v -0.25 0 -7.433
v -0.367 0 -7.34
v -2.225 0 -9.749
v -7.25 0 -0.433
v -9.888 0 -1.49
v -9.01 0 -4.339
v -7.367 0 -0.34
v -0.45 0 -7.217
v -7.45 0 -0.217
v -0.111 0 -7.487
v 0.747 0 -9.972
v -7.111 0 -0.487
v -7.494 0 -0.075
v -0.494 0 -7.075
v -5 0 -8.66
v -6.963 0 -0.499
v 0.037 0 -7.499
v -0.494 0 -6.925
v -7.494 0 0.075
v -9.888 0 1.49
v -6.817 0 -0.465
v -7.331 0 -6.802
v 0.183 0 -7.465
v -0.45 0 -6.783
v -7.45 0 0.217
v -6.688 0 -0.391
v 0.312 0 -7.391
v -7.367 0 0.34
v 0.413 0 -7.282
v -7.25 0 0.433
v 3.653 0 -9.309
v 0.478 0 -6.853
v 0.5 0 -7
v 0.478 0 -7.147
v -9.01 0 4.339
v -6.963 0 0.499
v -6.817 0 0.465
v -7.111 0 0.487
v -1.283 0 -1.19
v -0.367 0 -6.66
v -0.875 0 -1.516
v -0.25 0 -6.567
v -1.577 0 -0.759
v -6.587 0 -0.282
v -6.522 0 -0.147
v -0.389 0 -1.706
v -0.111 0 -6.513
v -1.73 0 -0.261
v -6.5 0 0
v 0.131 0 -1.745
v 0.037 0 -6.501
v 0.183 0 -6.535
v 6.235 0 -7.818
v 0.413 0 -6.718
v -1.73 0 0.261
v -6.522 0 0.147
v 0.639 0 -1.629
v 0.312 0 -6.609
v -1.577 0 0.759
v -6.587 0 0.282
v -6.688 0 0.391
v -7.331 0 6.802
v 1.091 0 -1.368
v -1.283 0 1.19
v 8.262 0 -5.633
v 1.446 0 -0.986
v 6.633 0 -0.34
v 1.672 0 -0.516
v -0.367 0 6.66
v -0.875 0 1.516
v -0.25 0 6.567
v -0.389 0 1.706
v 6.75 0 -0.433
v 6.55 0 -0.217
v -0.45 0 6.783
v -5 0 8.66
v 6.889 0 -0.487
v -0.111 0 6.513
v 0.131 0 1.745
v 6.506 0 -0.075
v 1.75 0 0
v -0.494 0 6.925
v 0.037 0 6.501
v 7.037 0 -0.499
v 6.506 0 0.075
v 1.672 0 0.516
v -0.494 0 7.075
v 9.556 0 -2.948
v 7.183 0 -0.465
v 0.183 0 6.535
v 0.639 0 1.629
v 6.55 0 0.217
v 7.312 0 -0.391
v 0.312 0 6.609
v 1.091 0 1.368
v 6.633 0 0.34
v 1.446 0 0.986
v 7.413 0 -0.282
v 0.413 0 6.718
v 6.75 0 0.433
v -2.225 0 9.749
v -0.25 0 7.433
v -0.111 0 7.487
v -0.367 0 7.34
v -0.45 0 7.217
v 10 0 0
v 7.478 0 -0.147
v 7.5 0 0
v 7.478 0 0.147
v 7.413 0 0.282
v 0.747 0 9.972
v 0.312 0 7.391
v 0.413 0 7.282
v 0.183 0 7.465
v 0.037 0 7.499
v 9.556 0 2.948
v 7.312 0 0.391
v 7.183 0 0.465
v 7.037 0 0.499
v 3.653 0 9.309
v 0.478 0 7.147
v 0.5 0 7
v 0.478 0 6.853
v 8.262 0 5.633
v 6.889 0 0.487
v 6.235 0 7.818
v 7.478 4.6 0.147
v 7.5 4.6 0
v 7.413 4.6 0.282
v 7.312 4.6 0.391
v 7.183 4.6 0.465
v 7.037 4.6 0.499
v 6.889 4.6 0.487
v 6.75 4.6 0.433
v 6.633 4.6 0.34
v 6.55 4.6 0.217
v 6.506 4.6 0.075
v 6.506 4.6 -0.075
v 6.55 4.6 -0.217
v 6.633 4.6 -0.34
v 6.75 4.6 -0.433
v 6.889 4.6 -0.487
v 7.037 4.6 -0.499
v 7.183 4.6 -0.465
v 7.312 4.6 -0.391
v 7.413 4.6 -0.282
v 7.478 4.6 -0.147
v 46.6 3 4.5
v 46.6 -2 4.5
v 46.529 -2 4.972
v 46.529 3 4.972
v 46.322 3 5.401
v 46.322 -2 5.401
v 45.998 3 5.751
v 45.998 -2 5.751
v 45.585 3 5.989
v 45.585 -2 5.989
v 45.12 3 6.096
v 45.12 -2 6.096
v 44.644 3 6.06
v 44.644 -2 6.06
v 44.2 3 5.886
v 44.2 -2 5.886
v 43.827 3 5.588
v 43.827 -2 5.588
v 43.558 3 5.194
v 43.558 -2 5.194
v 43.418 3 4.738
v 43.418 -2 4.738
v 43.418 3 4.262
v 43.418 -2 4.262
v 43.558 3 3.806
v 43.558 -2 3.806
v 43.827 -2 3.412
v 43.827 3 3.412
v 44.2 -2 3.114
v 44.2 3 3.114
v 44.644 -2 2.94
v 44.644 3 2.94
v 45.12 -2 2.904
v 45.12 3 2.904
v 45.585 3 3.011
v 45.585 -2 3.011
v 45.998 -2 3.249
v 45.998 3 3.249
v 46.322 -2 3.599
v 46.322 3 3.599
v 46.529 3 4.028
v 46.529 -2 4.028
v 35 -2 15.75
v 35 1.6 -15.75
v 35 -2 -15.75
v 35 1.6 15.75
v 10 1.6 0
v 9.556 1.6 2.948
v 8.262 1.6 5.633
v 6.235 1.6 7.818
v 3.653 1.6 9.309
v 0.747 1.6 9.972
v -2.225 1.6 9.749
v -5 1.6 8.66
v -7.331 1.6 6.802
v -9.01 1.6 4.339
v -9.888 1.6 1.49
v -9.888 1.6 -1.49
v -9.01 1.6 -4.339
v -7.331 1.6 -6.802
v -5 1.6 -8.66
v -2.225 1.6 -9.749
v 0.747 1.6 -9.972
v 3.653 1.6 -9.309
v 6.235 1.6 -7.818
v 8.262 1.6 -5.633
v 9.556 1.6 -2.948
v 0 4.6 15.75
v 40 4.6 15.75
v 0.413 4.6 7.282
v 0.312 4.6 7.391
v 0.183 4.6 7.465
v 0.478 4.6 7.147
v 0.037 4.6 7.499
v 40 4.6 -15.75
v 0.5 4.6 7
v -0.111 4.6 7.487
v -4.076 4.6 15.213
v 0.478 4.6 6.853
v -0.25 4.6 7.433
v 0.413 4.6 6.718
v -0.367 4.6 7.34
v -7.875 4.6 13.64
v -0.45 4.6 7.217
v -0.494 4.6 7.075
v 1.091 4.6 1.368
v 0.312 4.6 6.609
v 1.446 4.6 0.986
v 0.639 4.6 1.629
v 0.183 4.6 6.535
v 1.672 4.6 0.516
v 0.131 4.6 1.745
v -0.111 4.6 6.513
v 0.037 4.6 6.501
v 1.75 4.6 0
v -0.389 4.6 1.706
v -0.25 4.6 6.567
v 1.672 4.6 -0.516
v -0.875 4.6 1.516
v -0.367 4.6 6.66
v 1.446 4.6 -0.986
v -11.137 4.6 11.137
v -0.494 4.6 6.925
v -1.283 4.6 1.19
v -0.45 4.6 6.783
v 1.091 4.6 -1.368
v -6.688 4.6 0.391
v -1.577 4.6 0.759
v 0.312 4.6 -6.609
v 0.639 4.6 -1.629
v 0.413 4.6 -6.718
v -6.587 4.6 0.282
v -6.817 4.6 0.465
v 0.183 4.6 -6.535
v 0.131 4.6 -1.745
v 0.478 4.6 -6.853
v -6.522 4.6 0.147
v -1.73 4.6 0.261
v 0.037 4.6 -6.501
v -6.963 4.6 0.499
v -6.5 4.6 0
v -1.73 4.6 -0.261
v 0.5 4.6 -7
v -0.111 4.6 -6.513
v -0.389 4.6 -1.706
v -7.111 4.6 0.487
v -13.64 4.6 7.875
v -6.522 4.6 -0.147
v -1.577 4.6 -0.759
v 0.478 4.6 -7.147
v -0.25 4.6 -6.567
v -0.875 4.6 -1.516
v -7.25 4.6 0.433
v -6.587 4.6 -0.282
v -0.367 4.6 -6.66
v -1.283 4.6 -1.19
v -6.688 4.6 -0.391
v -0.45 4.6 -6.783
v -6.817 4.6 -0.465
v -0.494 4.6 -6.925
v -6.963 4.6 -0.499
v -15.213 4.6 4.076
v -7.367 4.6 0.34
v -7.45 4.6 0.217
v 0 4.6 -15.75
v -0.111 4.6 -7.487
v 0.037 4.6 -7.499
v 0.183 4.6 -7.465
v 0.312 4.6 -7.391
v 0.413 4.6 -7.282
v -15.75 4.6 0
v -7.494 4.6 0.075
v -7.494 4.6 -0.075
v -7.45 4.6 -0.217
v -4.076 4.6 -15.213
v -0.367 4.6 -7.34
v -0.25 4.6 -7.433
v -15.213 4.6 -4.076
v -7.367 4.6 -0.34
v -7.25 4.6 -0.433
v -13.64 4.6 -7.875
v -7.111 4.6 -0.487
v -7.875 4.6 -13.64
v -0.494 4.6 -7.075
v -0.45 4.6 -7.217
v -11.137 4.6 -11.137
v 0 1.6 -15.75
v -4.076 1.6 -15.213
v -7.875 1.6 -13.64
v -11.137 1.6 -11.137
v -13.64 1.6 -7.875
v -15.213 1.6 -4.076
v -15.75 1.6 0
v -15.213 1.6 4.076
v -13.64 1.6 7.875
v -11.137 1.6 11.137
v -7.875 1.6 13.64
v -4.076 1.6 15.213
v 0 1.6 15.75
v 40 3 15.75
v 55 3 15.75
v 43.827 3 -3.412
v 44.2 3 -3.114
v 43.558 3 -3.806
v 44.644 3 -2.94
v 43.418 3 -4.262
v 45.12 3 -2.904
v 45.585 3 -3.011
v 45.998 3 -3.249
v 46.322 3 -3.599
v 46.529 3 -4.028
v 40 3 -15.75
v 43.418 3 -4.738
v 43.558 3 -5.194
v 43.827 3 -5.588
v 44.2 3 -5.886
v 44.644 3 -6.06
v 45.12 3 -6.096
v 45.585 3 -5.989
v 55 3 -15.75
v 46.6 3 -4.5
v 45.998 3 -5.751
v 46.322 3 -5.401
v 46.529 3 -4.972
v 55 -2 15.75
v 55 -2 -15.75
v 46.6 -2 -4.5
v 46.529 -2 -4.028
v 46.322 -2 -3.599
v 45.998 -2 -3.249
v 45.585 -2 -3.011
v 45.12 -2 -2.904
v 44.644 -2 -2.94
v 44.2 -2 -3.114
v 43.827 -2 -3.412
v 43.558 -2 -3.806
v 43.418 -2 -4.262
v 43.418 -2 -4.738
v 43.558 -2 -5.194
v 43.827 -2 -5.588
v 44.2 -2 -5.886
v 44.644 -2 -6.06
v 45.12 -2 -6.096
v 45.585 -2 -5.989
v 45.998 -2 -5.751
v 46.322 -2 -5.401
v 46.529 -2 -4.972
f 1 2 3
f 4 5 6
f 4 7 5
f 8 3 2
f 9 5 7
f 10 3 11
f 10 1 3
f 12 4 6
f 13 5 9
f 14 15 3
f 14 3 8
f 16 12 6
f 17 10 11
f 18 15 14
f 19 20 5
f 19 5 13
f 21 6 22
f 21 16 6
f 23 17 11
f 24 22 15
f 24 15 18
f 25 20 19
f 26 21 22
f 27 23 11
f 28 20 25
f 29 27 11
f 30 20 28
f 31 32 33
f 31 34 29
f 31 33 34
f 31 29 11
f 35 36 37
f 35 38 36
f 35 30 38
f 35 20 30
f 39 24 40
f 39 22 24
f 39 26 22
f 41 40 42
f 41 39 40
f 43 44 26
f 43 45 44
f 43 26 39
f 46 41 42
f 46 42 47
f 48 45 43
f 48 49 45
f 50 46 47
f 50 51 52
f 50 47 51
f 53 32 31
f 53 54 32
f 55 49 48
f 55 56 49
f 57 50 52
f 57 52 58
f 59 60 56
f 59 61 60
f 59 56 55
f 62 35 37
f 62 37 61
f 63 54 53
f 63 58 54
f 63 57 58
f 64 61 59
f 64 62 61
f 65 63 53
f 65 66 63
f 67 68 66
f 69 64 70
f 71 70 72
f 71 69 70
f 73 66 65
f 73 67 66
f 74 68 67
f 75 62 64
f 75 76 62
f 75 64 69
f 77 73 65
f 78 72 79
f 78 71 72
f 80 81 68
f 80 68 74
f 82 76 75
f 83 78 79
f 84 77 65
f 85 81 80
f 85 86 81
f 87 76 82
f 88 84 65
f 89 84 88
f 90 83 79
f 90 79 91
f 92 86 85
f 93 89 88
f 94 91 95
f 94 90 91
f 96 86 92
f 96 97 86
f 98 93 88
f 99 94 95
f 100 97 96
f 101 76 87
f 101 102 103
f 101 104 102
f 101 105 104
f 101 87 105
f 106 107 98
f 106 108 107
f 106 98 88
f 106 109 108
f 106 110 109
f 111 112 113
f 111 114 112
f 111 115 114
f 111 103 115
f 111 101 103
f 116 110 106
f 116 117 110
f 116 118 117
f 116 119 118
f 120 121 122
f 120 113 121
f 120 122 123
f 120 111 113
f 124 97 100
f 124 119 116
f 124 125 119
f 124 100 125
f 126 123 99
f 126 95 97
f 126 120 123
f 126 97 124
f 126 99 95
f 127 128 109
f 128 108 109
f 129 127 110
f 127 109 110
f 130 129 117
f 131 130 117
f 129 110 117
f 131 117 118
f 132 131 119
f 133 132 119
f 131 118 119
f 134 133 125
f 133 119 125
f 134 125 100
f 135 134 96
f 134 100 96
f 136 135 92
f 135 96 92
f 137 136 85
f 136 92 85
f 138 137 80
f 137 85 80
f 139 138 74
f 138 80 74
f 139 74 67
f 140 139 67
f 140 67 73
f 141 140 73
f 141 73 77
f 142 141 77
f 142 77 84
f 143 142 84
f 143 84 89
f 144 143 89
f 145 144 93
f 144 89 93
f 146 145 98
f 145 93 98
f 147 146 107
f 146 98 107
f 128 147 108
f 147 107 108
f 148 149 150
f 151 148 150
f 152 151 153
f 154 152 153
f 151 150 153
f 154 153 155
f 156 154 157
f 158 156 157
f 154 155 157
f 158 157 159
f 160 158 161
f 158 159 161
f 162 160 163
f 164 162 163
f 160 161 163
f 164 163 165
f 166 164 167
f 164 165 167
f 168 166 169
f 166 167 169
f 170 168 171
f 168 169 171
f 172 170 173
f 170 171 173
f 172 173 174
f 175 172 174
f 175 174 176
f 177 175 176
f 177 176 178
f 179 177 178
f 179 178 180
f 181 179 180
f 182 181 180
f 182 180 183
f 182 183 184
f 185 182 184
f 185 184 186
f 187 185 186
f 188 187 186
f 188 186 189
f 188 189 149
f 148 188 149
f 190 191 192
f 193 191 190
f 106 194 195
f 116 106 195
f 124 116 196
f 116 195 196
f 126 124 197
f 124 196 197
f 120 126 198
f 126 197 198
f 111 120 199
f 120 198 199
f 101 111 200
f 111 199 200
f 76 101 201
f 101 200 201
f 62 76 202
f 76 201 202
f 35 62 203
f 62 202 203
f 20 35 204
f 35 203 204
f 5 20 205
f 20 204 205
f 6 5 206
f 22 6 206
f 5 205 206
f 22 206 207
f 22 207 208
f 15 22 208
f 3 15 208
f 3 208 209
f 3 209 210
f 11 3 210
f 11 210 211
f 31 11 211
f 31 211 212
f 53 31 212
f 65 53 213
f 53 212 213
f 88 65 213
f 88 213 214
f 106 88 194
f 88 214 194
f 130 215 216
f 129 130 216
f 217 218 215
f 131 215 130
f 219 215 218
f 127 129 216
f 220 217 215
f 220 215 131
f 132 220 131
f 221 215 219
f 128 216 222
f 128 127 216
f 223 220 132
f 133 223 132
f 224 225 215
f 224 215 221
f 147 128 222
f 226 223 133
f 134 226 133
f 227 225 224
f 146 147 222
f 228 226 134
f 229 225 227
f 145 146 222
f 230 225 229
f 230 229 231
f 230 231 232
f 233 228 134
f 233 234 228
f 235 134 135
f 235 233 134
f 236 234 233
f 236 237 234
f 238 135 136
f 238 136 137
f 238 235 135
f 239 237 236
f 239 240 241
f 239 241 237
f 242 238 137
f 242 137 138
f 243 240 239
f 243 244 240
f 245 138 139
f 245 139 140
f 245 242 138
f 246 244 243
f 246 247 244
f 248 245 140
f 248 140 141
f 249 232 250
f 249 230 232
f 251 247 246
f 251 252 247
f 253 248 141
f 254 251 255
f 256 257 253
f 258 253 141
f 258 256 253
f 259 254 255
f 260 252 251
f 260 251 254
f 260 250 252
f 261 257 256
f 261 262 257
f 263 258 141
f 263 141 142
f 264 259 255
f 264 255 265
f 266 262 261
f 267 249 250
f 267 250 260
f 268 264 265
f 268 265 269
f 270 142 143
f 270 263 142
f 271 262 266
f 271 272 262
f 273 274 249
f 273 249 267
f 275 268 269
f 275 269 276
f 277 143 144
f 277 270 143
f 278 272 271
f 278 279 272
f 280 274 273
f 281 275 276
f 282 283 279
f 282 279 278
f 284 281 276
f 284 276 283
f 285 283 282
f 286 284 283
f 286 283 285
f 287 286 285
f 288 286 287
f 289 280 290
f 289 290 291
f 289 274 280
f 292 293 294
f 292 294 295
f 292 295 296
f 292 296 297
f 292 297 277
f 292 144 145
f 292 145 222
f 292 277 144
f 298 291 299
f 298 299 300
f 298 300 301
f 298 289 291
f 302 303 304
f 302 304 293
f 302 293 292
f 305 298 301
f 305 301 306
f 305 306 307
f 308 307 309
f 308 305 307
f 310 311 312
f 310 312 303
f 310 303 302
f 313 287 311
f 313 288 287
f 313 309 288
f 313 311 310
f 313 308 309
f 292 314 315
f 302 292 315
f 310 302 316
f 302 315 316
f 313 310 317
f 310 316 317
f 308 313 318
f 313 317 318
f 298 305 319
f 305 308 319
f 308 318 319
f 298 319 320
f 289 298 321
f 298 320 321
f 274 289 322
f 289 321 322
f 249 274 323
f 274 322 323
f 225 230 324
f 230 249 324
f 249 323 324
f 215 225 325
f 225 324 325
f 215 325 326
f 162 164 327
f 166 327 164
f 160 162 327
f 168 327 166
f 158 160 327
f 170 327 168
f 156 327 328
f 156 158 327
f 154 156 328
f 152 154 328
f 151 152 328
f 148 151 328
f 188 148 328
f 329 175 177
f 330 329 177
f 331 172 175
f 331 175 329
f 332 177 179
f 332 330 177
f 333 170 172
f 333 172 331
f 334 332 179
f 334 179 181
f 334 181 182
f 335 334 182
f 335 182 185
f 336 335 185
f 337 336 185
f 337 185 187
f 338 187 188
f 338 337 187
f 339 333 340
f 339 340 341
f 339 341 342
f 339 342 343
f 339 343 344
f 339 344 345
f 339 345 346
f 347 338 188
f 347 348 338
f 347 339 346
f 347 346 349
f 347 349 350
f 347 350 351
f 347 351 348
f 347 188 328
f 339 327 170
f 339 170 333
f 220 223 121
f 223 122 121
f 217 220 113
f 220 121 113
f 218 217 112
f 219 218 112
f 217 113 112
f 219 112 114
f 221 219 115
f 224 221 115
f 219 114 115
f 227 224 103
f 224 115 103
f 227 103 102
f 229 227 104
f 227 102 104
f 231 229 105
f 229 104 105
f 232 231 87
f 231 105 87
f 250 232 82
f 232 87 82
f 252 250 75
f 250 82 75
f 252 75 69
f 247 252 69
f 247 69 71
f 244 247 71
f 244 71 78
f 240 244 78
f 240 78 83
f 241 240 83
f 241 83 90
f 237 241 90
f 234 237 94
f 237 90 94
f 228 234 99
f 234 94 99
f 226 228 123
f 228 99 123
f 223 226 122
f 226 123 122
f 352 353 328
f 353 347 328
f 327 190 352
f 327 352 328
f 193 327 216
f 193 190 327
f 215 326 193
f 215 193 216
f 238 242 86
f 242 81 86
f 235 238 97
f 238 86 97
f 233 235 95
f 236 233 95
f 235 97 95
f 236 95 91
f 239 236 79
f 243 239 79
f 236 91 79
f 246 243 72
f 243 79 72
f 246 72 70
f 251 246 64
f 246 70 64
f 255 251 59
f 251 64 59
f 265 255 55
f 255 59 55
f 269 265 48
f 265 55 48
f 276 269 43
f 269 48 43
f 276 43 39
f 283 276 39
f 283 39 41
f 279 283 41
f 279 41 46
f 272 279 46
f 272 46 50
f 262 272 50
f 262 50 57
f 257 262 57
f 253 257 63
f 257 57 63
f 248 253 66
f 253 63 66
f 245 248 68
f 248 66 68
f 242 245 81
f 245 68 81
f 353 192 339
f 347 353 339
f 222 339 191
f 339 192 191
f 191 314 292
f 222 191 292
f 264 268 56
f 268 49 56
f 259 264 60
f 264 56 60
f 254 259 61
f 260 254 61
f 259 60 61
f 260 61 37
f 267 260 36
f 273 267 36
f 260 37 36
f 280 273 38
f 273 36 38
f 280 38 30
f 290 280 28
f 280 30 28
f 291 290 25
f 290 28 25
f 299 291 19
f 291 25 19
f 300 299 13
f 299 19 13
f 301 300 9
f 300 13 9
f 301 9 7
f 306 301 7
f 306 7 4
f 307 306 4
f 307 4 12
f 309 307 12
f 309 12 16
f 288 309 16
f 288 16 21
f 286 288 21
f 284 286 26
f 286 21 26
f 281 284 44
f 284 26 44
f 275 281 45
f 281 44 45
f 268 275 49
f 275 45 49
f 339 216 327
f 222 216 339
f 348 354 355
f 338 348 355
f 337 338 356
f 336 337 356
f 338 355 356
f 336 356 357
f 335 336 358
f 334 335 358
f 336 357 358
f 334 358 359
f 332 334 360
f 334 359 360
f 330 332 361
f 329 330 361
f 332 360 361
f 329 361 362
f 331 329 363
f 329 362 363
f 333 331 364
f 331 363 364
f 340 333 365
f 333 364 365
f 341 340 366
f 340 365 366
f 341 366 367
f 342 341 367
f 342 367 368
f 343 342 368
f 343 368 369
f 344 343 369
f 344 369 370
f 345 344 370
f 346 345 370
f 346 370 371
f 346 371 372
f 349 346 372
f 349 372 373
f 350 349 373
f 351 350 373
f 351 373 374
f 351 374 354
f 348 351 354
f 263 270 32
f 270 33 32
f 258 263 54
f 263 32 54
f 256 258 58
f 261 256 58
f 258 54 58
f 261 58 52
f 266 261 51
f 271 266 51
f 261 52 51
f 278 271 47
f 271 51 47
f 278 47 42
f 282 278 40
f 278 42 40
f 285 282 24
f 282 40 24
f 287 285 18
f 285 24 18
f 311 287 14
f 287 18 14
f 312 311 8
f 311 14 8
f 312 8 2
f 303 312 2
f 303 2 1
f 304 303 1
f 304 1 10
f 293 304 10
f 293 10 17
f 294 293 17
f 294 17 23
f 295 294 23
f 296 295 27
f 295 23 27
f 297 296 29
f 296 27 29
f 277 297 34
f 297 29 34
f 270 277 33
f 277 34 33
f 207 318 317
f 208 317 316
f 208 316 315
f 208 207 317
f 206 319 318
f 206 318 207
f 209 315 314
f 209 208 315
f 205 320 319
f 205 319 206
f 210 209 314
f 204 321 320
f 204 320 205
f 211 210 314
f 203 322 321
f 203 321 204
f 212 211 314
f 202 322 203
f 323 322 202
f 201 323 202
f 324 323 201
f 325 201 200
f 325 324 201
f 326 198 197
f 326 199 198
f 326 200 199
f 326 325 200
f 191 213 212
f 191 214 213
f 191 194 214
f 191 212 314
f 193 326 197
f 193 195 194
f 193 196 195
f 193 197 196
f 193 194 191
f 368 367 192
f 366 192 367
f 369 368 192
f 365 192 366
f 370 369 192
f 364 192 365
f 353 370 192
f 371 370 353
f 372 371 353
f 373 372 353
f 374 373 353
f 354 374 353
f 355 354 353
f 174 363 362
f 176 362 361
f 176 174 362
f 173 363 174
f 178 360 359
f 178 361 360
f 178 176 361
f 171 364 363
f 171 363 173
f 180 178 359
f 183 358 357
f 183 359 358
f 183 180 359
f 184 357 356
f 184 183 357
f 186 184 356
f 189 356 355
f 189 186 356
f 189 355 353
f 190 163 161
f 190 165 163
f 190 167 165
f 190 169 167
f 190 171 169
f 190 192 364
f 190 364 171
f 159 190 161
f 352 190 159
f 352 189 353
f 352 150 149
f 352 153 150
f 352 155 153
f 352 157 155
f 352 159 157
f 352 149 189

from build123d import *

# Parameters (mm, degrees)
EXTRUDE_1_DEPTH     = 3
SKETCH_3_W          = 20
SKETCH_3_H          = 31.5
EXTRUDE_2_DEPTH     = 2
SKETCH_4_R          = 0.5
CUT_EXTRUDE_1_DEPTH = 10
SKETCH_5_R          = 1.6
CUT_EXTRUDE_2_DEPTH = 10
SKETCH_6_R          = 1.75
CUT_EXTRUDE_3_DEPTH = 17
CUT_EXTRUDE_4_DEPTH = 1.6
EXTRUDE_3_DEPTH     = 3
SKETCH_9_W          = 31.5
SKETCH_9_H          = 1.6
EXTRUDE_4_DEPTH     = 3
SKETCH_10_R         = 1.75
SKETCH_10_R_2       = 0.5
CUT_EXTRUDE_5_DEPTH = 10
SKETCH_12_R         = 10
EXTRUDE_6_DEPTH     = 1.6
SKETCH_13_W         = 31.5
SKETCH_13_H         = 1.6
EXTRUDE_7_DEPTH     = 2
SKETCH_15_R         = 1.75
SKETCH_15_R_2       = 0.5
CUT_EXTRUDE_6_DEPTH = 12


with BuildPart() as part:
    # 草图1 → 凸台-拉伸1 (new body)
    with BuildSketch(Plane(origin=(0, 0, 0), x_dir=(1, 0, 0), z_dir=(0, 1, 0))):
        with BuildLine():
            Line((0, -15.75), (55, -15.75))
            Line((55, -15.75), (55, 15.75))
            Line((55, 15.75), (0, 15.75))
            ThreePointArc((0, 15.75), (-15.75, 0), (0, -15.75))
        make_face()
    extrude(amount=EXTRUDE_1_DEPTH)

    # 草图3 → 凸台-拉伸2 (add)
    with BuildSketch(Plane.XZ):
        with Locations((45, 0)):
            Rectangle(SKETCH_3_W, SKETCH_3_H)
    extrude(amount=EXTRUDE_2_DEPTH)

    # 草图4 → 切除-拉伸1 (cut)
    with BuildSketch(Plane.XZ):
        with Locations((0, 7)):
            Circle(SKETCH_4_R)
        with Locations((7, 0)):
            Circle(SKETCH_4_R)
        with Locations((0, -7)):
            Circle(SKETCH_4_R)
        with Locations((-7, 0)):
            Circle(SKETCH_4_R)
    extrude(amount=-CUT_EXTRUDE_1_DEPTH, mode=Mode.SUBTRACT)

    # 草图5 → 切除-拉伸2 (cut)
    with BuildSketch(Plane.XZ.offset(2)):
        with Locations((45, -4.5)):
            Circle(SKETCH_5_R)
        with Locations((45, 4.5)):
            Circle(SKETCH_5_R)
    extrude(amount=-CUT_EXTRUDE_2_DEPTH, mode=Mode.SUBTRACT)

    # 草图6 → 切除-拉伸3 (cut)
    with BuildSketch(Plane.XZ):
        Circle(SKETCH_6_R)
    extrude(amount=-CUT_EXTRUDE_3_DEPTH, mode=Mode.SUBTRACT)

    # 草图7 → 切除-拉伸4 (cut)
    with BuildSketch(Plane.XZ):
        with BuildLine():
            Line((35, -15.75), (35, 15.75))
            Line((35, 15.75), (0, 15.75))
            ThreePointArc((0, 15.75), (-15.75, 0), (0, -15.75))
            Line((0, -15.75), (35, -15.75))
        make_face()
    extrude(amount=-CUT_EXTRUDE_4_DEPTH, mode=Mode.SUBTRACT)

    # 草图8 → 凸台-拉伸3 (add)
    with BuildSketch(Plane.XZ.offset(-1.6)):
        with BuildLine():
            Line((0, -15.75), (35, -15.75))
            Line((35, -15.75), (35, 15.75))
            Line((35, 15.75), (0, 15.75))
            ThreePointArc((0, 15.75), (-15.75, 0), (0, -15.75))
        make_face()
    extrude(amount=-EXTRUDE_3_DEPTH)

    # 草图9 → 凸台-拉伸4 (add)
    with BuildSketch(Plane(origin=(35, 0, 0), x_dir=(0, 0, -1), z_dir=(1, 0, 0))):
        with Locations((0, 3.8)):
            Rectangle(SKETCH_9_W, SKETCH_9_H)
    extrude(amount=EXTRUDE_4_DEPTH)

    # 草图10 → 切除-拉伸5 (cut)
    with BuildSketch(Plane.XZ.offset(-1.6)):
        Circle(SKETCH_10_R)
        with Locations((0, 7)):
            Circle(SKETCH_10_R_2)
        with Locations((7, 0)):
            Circle(SKETCH_10_R_2)
        with Locations((0, -7)):
            Circle(SKETCH_10_R_2)
        with Locations((-7, 0)):
            Circle(SKETCH_10_R_2)
    extrude(amount=-CUT_EXTRUDE_5_DEPTH, mode=Mode.SUBTRACT)

    # 草图12 → 凸台-拉伸6 (add)
    with BuildSketch(Plane.XZ.offset(-1.6)):
        Circle(SKETCH_12_R)
    extrude(amount=EXTRUDE_6_DEPTH)

    # 草图13 → 凸台-拉伸7 (add)
    with BuildSketch(Plane(origin=(38, 0, 0), x_dir=(0, 0, -1), z_dir=(1, 0, 0))):
        with Locations((0, 3.8)):
            Rectangle(SKETCH_13_W, SKETCH_13_H)
    extrude(amount=EXTRUDE_7_DEPTH)

    # 草图15 → 切除-拉伸6 (cut)
    with BuildSketch(Plane.XZ):
        Circle(SKETCH_15_R)
        with Locations((7, 0)):
            Circle(SKETCH_15_R_2)
        with Locations((0, -7)):
            Circle(SKETCH_15_R_2)
        with Locations((0, 7)):
            Circle(SKETCH_15_R_2)
        with Locations((-7, 0)):
            Circle(SKETCH_15_R_2)
    extrude(amount=-CUT_EXTRUDE_6_DEPTH, mode=Mode.SUBTRACT)


solid = part.part
